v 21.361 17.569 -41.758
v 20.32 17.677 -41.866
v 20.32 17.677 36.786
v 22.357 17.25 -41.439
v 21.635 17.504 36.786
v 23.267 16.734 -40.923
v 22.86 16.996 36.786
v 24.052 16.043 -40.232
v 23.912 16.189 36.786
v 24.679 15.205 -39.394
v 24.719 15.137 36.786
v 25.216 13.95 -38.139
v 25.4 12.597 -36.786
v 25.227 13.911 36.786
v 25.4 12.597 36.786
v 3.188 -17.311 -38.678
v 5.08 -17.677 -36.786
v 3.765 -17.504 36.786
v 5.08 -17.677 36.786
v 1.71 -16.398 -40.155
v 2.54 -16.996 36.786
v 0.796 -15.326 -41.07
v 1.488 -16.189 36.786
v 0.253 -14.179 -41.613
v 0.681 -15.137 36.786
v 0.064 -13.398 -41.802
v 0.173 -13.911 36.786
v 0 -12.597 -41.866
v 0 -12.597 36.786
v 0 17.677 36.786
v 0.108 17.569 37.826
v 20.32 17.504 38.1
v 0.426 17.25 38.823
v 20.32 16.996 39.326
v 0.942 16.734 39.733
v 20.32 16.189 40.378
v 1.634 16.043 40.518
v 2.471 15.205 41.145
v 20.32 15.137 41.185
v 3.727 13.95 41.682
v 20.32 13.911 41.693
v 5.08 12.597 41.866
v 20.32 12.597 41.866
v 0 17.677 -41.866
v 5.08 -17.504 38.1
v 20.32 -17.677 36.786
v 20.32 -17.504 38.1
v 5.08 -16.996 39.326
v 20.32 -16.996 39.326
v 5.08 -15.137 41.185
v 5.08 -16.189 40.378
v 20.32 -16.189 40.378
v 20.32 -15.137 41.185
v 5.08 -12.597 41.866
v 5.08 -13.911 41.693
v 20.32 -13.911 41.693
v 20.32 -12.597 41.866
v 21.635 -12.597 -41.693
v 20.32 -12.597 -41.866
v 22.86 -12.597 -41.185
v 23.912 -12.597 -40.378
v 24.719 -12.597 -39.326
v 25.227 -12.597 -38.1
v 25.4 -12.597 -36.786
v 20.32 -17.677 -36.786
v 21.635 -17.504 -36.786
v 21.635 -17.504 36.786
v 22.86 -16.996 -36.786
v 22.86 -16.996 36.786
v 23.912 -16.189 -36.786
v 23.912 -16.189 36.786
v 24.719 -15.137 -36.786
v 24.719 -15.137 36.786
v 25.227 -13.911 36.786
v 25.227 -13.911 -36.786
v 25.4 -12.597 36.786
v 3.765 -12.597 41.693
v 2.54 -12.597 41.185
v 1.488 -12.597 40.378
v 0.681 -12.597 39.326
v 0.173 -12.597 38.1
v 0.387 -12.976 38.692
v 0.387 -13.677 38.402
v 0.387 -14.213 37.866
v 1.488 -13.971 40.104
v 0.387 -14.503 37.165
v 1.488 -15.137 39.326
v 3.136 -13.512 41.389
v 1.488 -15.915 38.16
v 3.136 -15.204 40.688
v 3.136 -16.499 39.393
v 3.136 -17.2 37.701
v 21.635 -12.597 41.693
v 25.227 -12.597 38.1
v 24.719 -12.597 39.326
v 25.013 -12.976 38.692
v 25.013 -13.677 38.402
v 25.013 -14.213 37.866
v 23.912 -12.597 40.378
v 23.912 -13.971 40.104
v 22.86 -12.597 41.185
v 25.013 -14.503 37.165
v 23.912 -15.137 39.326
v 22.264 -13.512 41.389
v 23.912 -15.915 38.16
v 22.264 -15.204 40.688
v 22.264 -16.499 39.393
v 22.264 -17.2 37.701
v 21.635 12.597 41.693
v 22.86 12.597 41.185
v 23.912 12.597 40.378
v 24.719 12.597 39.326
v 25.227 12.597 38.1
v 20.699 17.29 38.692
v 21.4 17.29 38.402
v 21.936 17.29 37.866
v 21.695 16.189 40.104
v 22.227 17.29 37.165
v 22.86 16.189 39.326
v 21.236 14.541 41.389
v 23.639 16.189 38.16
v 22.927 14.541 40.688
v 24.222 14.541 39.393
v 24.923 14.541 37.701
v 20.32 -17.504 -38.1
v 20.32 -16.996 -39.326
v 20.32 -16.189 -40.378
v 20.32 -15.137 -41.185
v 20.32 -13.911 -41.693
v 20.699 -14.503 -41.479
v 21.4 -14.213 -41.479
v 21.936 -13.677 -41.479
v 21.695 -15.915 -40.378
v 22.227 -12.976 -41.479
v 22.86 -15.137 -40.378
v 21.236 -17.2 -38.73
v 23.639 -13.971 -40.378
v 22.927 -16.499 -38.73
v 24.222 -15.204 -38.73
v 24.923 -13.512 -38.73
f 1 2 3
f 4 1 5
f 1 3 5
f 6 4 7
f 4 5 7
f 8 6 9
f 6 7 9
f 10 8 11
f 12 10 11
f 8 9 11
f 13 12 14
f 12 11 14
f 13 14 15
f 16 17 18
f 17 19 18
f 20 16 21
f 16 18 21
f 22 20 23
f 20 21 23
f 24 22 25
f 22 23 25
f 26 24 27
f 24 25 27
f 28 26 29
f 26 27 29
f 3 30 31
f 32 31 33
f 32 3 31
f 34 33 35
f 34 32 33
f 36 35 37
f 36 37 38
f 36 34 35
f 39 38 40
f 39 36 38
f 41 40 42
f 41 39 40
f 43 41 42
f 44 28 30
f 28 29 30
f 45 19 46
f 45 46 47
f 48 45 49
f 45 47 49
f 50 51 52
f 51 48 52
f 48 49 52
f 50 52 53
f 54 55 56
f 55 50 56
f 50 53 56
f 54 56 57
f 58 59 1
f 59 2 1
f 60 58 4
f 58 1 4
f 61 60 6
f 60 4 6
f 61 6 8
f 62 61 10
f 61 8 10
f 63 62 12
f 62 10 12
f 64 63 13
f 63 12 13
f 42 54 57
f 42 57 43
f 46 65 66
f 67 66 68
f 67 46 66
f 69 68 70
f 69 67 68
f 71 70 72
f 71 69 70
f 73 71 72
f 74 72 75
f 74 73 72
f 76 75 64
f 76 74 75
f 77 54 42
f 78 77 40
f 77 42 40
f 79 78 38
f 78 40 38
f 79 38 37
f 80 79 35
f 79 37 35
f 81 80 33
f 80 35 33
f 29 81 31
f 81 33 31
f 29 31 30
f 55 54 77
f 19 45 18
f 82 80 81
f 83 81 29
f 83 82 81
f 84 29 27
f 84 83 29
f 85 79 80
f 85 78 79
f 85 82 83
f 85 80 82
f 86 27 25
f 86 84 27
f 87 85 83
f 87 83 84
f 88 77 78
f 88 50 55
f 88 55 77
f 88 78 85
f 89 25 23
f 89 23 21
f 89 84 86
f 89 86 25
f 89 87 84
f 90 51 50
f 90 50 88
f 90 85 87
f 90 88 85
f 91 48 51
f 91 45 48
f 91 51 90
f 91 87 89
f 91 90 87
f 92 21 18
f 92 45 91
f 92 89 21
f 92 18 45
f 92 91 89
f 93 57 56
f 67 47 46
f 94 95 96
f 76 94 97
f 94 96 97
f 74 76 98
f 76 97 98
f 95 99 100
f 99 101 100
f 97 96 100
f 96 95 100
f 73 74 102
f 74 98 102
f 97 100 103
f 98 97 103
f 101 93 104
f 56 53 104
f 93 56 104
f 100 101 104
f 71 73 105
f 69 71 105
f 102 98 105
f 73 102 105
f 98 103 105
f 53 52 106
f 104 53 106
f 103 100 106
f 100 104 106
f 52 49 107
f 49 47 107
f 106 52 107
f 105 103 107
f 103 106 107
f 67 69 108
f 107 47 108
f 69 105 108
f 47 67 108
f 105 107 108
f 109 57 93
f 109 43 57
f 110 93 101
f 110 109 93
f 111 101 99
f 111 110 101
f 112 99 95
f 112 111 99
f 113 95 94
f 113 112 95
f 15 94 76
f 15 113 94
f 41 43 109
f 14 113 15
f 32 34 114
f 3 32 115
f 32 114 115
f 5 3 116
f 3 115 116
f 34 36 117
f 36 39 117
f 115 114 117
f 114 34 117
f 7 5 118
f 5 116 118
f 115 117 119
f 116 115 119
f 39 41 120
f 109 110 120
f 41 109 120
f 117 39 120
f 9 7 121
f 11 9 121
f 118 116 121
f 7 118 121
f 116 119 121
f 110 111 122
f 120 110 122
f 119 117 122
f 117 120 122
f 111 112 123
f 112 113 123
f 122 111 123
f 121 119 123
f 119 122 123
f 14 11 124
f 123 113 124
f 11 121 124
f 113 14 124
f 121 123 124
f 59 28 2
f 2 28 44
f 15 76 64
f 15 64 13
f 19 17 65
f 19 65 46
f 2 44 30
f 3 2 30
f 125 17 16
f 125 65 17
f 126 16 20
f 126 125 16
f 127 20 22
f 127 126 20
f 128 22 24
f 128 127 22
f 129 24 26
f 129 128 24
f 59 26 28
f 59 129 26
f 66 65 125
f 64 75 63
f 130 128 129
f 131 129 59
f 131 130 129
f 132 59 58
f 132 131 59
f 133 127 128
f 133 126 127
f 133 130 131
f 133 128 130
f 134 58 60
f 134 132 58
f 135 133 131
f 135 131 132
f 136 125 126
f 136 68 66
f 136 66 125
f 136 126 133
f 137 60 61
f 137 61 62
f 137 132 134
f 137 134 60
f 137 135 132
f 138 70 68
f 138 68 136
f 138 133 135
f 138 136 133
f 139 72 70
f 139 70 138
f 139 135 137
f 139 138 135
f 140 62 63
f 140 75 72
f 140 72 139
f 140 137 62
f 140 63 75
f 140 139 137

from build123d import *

# Parameters (mm, degrees)
F0_W     = 35.353254
F0_H     = 83.731398
F1_DEPTH = 25.4
F2_R     = 5.08


with BuildPart() as f1:
    # F0 (on Right) → F1 (new body)
    with BuildSketch(Plane.YZ):
        Rectangle(F0_W, F0_H)
    extrude(amount=F1_DEPTH)

    # F2
    f2_edges = [f1.edges().sort_by_distance(p)[0] for p in [
        (12.7, -17.676627, 41.865699),
        (25.4, 0, 41.865699),
        (12.7, 17.676627, 41.865699),
        (0, 0, 41.865699),
        (25.4, -17.676627, 0),
        (25.4, 17.676627, 0),
        (0, -17.676627, 0),
        (12.7, -17.676627, -41.865699),
        (25.4, 0, -41.865699),
    ]]
    fillet(f2_edges, radius=F2_R)


solid = f1.part
